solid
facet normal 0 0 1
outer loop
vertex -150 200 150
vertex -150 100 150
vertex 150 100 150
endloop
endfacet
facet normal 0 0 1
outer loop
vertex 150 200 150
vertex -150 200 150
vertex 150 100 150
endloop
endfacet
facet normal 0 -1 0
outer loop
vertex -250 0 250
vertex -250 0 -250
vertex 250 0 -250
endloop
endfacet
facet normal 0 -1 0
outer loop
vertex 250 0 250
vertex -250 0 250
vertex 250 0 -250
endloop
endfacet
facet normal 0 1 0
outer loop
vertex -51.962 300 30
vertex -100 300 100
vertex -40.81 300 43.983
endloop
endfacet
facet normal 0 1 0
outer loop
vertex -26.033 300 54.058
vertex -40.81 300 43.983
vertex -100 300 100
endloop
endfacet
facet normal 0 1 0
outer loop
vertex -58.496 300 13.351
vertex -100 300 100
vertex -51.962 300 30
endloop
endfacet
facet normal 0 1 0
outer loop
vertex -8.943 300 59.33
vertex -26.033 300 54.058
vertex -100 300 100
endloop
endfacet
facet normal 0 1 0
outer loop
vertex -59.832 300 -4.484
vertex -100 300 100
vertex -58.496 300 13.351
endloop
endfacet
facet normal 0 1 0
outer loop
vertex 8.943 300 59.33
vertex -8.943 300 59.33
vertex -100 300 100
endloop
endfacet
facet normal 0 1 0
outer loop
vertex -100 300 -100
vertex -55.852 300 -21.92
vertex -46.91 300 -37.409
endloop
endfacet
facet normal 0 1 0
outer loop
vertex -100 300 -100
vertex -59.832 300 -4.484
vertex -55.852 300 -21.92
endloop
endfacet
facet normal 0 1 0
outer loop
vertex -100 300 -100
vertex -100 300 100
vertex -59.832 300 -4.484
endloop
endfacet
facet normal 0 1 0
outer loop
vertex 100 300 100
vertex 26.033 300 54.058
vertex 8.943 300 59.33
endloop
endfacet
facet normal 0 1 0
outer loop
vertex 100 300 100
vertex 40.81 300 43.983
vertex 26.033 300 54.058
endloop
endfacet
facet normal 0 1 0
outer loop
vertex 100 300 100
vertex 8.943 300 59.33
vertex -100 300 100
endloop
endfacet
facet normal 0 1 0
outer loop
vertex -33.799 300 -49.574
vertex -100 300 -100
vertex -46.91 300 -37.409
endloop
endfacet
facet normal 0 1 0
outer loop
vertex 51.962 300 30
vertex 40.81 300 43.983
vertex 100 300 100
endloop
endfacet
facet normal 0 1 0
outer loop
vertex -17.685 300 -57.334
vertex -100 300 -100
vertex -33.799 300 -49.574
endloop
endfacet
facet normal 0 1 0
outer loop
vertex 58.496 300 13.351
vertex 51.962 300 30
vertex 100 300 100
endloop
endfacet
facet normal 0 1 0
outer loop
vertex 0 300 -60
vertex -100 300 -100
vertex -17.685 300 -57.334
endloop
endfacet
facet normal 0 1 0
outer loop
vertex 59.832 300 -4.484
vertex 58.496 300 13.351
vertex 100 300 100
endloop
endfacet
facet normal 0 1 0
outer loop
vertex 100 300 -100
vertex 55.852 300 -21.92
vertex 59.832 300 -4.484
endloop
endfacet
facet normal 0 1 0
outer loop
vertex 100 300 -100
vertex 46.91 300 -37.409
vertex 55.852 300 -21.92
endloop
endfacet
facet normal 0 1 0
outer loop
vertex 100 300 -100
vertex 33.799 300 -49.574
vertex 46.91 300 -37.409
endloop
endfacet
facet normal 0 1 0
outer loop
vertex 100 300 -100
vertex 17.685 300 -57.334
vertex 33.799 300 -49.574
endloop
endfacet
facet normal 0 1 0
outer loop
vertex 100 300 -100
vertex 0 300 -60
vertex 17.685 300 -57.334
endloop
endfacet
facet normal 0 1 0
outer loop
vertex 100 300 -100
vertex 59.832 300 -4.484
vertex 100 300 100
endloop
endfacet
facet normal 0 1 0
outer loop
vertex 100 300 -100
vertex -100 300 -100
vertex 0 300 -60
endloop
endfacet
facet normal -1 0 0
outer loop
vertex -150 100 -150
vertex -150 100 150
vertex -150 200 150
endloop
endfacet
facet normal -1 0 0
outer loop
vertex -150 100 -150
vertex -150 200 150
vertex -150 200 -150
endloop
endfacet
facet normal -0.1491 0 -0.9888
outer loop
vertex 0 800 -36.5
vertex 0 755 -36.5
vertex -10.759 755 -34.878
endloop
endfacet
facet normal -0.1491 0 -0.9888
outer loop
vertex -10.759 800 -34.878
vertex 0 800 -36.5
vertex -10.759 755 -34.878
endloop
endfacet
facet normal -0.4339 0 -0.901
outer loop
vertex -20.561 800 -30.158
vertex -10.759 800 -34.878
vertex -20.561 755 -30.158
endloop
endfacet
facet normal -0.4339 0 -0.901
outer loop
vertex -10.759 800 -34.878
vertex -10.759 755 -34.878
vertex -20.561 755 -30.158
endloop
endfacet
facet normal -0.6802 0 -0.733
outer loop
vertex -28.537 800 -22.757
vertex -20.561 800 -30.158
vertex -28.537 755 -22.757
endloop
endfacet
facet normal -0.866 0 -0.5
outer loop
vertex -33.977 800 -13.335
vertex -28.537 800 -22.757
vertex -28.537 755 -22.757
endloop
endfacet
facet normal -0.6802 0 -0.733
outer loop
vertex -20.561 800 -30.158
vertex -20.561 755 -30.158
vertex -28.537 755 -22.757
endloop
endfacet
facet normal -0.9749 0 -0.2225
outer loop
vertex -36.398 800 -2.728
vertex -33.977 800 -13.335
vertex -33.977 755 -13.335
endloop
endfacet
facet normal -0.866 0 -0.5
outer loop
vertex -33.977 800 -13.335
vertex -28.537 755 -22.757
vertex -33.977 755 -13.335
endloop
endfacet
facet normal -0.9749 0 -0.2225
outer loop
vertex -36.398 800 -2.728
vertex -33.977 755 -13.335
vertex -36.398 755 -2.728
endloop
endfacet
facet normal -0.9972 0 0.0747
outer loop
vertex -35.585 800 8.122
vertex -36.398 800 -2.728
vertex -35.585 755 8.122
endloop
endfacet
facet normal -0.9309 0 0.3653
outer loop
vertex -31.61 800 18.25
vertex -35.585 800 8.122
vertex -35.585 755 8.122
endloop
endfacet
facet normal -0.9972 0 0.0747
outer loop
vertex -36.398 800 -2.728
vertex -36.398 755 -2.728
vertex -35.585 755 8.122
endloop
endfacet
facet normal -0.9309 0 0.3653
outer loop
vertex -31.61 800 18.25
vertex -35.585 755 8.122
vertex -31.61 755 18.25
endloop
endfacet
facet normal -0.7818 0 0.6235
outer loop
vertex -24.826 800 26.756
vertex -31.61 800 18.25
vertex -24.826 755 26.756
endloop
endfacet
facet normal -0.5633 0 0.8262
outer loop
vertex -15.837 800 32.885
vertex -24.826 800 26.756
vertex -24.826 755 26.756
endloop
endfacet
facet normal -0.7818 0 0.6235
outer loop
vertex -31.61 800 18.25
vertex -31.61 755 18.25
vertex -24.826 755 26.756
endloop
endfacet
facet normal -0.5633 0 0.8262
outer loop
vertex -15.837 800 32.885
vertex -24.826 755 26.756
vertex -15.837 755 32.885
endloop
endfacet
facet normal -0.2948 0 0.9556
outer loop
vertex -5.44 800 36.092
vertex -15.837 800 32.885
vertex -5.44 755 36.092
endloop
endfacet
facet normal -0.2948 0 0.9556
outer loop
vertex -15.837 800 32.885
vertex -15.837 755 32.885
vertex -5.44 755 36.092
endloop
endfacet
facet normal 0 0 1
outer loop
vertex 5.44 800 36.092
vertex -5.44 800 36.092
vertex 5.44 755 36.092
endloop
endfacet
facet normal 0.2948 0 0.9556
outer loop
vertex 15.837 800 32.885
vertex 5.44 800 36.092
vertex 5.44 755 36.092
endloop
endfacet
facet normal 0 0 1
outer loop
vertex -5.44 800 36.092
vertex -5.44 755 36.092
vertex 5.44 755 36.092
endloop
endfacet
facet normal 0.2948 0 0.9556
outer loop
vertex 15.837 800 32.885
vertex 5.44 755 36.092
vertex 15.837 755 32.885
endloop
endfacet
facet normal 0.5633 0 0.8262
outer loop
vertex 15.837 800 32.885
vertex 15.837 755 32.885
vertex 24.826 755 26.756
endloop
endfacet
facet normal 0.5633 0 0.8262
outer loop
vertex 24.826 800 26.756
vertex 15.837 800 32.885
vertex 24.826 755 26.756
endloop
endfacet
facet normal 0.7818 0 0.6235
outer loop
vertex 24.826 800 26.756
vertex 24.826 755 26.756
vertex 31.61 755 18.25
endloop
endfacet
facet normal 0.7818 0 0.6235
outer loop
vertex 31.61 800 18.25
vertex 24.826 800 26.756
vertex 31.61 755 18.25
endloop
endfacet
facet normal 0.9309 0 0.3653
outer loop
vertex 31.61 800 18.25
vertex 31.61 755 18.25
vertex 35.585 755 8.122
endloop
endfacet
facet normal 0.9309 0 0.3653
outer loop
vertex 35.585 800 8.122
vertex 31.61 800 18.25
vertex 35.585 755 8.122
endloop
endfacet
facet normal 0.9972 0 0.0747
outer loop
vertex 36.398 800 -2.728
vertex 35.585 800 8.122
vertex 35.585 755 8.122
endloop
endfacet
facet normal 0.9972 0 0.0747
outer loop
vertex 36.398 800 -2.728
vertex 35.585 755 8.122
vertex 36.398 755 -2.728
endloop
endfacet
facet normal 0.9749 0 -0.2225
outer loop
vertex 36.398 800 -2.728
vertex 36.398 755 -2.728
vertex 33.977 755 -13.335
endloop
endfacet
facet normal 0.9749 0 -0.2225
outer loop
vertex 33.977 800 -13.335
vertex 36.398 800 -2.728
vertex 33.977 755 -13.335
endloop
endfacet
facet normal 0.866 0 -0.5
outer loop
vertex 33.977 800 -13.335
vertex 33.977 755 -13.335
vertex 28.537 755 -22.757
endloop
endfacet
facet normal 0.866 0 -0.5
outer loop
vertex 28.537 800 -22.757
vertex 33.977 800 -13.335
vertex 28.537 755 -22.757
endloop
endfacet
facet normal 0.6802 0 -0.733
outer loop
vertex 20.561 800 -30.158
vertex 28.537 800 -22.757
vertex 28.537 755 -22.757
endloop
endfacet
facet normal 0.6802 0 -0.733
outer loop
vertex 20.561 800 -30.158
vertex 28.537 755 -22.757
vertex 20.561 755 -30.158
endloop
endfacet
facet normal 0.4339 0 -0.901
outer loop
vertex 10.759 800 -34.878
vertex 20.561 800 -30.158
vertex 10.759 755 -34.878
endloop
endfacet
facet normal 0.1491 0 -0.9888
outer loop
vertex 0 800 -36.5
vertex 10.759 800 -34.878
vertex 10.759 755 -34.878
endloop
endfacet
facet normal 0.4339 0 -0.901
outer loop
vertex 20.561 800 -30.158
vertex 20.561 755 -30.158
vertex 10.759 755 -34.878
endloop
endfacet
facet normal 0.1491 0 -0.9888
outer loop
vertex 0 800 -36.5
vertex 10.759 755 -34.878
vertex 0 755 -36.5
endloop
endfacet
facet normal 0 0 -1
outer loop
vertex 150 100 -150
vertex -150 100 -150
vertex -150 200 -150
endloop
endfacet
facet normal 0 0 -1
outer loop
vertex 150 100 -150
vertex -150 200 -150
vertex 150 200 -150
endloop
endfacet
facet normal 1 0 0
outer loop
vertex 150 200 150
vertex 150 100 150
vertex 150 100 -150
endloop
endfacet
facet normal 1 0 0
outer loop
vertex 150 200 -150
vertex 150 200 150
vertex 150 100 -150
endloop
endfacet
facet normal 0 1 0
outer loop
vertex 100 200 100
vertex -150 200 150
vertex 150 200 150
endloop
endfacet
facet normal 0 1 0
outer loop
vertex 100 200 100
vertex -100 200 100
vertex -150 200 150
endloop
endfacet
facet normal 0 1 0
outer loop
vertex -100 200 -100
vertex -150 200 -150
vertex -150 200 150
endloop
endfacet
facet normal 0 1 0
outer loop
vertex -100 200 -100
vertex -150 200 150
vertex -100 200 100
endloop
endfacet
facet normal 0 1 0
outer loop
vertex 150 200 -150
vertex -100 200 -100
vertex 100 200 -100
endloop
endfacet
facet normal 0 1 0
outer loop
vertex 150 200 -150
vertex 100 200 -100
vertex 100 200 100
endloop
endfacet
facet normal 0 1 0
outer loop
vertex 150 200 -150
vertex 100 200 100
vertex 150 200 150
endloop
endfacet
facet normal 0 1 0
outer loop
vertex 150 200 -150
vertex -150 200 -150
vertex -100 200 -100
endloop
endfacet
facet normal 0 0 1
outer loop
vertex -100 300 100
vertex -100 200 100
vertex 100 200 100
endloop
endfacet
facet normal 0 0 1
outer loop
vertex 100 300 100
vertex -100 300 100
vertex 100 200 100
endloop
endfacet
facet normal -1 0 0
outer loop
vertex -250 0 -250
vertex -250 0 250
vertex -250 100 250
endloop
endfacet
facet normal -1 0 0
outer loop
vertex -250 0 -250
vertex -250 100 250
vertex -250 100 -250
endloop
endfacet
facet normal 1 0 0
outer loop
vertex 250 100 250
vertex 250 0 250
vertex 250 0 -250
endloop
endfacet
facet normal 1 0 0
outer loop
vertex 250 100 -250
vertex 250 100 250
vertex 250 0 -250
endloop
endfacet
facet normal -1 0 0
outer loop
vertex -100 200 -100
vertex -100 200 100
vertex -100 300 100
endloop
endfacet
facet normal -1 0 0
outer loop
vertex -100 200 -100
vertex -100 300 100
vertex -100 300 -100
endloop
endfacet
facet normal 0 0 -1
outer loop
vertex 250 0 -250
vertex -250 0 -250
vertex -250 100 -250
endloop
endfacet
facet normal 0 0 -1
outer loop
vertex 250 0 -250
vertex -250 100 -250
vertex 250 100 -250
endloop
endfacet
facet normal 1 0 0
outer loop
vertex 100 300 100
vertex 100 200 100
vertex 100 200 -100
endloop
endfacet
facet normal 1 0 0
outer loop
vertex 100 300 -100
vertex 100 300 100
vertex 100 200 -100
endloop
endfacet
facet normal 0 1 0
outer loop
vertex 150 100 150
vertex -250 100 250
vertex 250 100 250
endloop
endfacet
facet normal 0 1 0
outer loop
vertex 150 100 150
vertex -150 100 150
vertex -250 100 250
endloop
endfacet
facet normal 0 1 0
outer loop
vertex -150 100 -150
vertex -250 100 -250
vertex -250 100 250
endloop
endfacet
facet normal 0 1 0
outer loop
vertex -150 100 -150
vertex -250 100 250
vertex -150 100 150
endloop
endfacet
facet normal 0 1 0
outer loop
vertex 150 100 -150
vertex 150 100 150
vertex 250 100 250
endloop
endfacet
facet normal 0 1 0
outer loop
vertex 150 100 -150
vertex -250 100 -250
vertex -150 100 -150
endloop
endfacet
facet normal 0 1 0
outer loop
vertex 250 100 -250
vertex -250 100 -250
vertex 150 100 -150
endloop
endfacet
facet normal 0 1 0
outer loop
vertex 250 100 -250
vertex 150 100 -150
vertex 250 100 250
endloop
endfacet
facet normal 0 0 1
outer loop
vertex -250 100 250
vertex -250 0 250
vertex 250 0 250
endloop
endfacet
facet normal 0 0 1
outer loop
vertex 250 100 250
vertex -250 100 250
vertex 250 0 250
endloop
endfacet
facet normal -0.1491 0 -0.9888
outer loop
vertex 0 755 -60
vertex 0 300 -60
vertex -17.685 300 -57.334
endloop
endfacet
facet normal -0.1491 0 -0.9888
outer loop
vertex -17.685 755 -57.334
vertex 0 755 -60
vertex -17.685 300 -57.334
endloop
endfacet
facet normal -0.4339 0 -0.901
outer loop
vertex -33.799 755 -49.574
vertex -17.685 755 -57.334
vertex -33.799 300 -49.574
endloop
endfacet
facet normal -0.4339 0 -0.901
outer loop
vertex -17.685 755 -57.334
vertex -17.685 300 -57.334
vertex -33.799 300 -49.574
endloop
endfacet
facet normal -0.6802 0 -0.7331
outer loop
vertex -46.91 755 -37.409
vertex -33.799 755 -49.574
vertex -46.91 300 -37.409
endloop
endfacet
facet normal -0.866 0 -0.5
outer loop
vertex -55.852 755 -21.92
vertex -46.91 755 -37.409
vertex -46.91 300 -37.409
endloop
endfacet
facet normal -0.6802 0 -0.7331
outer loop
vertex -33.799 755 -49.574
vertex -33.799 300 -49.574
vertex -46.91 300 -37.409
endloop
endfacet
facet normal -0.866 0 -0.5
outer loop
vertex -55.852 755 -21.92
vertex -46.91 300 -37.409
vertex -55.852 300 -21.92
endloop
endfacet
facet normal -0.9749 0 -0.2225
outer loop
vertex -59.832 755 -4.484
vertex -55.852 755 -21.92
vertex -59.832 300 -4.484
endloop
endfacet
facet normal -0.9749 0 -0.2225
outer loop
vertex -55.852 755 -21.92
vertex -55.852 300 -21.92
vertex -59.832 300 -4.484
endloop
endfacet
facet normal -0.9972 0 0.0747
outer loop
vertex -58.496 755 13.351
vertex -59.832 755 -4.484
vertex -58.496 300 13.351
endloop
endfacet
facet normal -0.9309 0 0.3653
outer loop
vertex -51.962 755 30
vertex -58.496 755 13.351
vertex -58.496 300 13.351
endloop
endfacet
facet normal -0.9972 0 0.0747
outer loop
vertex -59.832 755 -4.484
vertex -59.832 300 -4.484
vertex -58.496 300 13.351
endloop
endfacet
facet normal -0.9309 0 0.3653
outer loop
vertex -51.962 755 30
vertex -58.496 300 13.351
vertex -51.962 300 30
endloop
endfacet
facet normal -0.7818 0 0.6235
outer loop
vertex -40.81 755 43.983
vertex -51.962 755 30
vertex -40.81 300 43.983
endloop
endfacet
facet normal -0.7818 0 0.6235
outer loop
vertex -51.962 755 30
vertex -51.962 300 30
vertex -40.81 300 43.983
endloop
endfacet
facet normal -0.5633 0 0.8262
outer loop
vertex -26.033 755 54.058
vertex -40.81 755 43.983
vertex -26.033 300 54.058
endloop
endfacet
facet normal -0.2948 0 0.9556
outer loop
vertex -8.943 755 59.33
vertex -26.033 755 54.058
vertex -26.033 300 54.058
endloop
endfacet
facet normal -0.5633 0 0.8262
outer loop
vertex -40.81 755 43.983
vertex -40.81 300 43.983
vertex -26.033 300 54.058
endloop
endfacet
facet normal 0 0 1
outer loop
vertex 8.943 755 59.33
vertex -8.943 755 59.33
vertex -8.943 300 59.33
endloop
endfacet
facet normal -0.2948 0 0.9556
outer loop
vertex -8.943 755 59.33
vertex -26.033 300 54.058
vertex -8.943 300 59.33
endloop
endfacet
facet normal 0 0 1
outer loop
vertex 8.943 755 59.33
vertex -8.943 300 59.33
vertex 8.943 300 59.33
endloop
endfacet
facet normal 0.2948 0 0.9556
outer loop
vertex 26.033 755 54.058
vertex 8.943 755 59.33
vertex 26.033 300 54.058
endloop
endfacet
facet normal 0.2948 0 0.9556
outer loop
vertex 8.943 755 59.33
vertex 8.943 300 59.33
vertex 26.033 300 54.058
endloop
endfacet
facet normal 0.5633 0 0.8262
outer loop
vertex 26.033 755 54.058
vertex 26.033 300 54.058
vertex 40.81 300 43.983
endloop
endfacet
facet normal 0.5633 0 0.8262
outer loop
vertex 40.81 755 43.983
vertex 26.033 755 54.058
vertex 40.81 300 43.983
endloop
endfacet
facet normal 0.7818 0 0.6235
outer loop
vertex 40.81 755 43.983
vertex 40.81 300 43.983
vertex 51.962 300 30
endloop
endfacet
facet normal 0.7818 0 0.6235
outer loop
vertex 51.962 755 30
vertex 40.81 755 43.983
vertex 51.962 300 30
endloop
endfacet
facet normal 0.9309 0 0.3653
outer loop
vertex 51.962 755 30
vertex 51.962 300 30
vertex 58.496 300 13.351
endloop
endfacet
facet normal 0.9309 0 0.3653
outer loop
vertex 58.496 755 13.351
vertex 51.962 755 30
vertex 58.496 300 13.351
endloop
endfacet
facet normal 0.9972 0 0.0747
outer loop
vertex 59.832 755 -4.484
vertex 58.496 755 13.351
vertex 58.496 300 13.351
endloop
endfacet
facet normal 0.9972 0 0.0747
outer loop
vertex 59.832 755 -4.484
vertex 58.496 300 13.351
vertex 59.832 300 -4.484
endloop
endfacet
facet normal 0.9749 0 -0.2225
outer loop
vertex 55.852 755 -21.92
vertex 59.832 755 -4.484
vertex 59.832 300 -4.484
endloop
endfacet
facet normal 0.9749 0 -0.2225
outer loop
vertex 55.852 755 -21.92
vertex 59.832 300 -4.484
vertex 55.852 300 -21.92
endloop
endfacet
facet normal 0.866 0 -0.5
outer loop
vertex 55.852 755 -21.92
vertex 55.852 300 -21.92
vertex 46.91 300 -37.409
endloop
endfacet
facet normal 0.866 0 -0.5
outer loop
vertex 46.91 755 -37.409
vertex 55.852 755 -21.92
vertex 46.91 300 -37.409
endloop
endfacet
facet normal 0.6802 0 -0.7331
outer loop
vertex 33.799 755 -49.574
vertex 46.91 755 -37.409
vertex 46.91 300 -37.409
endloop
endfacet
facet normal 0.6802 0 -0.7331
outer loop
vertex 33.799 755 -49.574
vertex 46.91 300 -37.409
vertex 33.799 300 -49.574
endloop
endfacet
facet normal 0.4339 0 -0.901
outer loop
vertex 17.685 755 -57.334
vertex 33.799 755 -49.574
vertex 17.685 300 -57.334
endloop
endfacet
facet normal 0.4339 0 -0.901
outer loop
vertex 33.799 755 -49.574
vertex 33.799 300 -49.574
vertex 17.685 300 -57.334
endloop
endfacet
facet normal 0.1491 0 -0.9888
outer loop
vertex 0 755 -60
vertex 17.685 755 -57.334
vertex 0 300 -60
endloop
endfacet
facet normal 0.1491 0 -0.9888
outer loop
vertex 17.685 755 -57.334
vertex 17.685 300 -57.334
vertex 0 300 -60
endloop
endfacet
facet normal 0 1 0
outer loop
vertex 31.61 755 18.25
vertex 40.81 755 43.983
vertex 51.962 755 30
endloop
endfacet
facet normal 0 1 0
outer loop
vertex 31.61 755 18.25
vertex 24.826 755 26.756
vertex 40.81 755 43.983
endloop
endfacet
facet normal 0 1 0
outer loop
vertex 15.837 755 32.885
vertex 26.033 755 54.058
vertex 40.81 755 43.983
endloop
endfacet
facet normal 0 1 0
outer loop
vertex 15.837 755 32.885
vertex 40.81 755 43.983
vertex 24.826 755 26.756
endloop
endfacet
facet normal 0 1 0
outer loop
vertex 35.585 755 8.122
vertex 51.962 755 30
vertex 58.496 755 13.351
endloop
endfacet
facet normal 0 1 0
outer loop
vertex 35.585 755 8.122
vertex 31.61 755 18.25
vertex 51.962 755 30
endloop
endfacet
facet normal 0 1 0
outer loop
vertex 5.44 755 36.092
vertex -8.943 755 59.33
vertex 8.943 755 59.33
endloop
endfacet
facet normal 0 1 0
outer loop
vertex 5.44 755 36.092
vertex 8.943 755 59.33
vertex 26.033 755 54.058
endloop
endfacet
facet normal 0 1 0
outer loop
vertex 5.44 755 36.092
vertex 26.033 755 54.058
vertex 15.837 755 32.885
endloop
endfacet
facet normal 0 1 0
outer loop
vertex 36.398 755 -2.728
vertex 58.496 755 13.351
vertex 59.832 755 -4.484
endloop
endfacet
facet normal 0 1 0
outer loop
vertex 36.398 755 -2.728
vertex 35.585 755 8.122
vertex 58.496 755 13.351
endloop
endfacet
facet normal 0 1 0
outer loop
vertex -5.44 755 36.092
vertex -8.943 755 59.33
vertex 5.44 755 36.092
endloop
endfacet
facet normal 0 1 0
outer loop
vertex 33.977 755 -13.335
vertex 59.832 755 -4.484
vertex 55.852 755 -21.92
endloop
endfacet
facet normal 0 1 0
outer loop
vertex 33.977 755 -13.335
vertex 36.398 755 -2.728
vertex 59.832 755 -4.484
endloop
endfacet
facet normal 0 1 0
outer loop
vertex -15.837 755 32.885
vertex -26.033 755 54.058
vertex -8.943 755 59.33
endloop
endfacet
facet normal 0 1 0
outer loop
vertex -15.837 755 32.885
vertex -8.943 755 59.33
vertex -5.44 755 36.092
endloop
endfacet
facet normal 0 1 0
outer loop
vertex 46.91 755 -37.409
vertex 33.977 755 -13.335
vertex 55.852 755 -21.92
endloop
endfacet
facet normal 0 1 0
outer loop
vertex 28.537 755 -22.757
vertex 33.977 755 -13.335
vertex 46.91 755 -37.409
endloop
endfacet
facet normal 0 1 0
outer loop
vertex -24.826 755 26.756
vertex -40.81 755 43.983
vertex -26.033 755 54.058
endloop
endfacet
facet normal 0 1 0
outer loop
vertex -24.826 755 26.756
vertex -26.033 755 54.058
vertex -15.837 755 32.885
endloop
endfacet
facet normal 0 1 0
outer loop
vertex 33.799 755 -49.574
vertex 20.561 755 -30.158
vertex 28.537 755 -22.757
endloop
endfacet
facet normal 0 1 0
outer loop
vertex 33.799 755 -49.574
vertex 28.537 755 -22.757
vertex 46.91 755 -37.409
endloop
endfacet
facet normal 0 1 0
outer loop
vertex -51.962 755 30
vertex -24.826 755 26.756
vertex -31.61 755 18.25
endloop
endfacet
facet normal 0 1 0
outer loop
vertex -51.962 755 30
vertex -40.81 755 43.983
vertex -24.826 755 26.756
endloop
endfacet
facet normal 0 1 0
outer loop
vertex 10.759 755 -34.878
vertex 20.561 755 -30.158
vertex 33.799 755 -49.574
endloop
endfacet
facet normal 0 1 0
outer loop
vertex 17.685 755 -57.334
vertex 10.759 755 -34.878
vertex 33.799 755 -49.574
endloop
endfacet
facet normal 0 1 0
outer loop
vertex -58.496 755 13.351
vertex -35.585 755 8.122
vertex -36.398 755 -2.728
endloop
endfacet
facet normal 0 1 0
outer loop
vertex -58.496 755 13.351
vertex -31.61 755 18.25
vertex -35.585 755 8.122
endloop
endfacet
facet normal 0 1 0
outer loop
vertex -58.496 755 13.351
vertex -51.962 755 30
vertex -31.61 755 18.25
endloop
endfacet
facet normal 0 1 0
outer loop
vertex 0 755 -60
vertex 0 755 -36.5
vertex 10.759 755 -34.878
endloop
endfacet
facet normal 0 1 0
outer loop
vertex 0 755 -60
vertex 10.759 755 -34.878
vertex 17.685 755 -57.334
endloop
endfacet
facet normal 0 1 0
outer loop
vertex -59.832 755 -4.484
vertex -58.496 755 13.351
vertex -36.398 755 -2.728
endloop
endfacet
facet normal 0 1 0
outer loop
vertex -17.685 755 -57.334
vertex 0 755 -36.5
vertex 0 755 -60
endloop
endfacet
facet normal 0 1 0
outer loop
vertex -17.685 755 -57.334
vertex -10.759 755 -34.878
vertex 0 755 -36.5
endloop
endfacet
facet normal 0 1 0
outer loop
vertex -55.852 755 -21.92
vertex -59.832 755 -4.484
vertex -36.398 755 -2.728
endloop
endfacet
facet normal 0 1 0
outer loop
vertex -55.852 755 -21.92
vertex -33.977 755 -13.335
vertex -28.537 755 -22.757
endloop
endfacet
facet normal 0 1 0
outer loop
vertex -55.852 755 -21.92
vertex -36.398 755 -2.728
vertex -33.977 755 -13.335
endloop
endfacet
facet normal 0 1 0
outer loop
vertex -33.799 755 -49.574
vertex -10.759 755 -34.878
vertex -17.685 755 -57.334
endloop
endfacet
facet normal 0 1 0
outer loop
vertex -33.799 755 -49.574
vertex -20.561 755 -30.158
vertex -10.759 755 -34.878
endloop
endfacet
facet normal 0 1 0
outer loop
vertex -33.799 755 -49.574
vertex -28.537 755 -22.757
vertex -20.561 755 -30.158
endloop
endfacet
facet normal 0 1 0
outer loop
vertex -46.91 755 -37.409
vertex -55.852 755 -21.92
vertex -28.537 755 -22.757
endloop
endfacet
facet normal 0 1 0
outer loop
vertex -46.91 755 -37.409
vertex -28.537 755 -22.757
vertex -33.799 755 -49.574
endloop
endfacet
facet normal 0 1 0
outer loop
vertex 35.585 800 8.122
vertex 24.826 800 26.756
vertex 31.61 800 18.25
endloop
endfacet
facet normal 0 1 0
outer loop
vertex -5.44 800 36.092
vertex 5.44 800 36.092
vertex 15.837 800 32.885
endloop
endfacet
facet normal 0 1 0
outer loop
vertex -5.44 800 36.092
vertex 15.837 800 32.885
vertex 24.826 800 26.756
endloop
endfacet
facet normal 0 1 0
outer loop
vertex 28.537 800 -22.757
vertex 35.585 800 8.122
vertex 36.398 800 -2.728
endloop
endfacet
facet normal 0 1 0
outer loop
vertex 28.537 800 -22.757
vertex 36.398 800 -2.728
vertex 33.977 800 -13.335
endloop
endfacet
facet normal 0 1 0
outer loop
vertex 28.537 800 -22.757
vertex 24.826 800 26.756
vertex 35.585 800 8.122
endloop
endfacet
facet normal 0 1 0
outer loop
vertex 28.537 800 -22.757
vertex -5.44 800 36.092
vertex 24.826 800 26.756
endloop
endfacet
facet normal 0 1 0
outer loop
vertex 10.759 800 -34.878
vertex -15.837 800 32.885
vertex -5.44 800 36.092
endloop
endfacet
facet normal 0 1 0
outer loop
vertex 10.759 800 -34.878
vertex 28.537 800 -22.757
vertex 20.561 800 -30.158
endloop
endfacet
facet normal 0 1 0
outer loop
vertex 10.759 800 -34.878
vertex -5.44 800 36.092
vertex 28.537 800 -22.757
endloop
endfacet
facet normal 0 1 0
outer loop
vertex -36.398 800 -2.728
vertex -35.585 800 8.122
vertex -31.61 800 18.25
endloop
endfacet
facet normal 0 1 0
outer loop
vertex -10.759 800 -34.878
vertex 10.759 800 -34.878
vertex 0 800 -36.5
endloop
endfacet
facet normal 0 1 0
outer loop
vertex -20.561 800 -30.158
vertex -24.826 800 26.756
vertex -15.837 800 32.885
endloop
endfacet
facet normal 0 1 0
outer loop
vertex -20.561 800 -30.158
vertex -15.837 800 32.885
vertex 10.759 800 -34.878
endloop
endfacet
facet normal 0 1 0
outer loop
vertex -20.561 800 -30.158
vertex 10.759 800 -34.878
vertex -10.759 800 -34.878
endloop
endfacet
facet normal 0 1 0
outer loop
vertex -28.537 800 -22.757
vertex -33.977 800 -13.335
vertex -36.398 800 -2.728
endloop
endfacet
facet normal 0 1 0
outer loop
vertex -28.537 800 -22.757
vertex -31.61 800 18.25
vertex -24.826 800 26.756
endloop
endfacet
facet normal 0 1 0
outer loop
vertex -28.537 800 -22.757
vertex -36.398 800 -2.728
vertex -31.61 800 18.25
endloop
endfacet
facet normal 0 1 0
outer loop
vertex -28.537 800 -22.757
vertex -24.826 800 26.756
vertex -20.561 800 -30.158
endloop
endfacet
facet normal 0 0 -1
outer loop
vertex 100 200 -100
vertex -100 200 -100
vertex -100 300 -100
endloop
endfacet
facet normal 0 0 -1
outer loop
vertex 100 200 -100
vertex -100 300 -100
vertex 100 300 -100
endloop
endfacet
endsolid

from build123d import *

# Parameters (mm, degrees)
SKETCH1_W           = 500
SKETCH1_H           = 500
BOSS_EXTRUDE1_DEPTH = 100
SKETCH2_W           = 300
SKETCH2_H           = 300
BOSS_EXTRUDE2_DEPTH = 100
SKETCH3_W           = 200
SKETCH3_H           = 200
BOSS_EXTRUDE3_DEPTH = 100
SKETCH4_R           = 60
BOSS_EXTRUDE4_DEPTH = 455
SKETCH5_R           = 36.5
BOSS_EXTRUDE5_DEPTH = 45


with BuildPart() as part:
    # Sketch1 → Boss-Extrude1 (new body)
    with BuildSketch(Plane(origin=(0, 0, 0), x_dir=(1, 0, 0), z_dir=(0, 1, 0))):
        Rectangle(SKETCH1_W, SKETCH1_H)
    extrude(amount=BOSS_EXTRUDE1_DEPTH)

    # Sketch2 → Boss-Extrude2 (add)
    with BuildSketch(Plane(origin=(0, 100, 0), x_dir=(1, 0, 0), z_dir=(0, 1, 0))):
        Rectangle(SKETCH2_W, SKETCH2_H)
    extrude(amount=BOSS_EXTRUDE2_DEPTH)

    # Sketch3 → Boss-Extrude3 (add)
    with BuildSketch(Plane(origin=(0, 200, 0), x_dir=(1, 0, 0), z_dir=(0, 1, 0))):
        Rectangle(SKETCH3_W, SKETCH3_H)
    extrude(amount=BOSS_EXTRUDE3_DEPTH)

    # Sketch4 → Boss-Extrude4 (add)
    with BuildSketch(Plane(origin=(0, 300, 0), x_dir=(1, 0, 0), z_dir=(0, 1, 0))):
        with Locations(Location((0, 0, 0), (0, 0, 90))):
            Circle(SKETCH4_R)
    extrude(amount=BOSS_EXTRUDE4_DEPTH)

    # Sketch5 → Boss-Extrude5 (add)
    with BuildSketch(Plane(origin=(0, 755, 0), x_dir=(1, 0, 0), z_dir=(0, 1, 0))):
        with Locations(Location((0, 0, 0), (0, 0, 90))):
            Circle(SKETCH5_R)
    extrude(amount=BOSS_EXTRUDE5_DEPTH)


solid = part.part
